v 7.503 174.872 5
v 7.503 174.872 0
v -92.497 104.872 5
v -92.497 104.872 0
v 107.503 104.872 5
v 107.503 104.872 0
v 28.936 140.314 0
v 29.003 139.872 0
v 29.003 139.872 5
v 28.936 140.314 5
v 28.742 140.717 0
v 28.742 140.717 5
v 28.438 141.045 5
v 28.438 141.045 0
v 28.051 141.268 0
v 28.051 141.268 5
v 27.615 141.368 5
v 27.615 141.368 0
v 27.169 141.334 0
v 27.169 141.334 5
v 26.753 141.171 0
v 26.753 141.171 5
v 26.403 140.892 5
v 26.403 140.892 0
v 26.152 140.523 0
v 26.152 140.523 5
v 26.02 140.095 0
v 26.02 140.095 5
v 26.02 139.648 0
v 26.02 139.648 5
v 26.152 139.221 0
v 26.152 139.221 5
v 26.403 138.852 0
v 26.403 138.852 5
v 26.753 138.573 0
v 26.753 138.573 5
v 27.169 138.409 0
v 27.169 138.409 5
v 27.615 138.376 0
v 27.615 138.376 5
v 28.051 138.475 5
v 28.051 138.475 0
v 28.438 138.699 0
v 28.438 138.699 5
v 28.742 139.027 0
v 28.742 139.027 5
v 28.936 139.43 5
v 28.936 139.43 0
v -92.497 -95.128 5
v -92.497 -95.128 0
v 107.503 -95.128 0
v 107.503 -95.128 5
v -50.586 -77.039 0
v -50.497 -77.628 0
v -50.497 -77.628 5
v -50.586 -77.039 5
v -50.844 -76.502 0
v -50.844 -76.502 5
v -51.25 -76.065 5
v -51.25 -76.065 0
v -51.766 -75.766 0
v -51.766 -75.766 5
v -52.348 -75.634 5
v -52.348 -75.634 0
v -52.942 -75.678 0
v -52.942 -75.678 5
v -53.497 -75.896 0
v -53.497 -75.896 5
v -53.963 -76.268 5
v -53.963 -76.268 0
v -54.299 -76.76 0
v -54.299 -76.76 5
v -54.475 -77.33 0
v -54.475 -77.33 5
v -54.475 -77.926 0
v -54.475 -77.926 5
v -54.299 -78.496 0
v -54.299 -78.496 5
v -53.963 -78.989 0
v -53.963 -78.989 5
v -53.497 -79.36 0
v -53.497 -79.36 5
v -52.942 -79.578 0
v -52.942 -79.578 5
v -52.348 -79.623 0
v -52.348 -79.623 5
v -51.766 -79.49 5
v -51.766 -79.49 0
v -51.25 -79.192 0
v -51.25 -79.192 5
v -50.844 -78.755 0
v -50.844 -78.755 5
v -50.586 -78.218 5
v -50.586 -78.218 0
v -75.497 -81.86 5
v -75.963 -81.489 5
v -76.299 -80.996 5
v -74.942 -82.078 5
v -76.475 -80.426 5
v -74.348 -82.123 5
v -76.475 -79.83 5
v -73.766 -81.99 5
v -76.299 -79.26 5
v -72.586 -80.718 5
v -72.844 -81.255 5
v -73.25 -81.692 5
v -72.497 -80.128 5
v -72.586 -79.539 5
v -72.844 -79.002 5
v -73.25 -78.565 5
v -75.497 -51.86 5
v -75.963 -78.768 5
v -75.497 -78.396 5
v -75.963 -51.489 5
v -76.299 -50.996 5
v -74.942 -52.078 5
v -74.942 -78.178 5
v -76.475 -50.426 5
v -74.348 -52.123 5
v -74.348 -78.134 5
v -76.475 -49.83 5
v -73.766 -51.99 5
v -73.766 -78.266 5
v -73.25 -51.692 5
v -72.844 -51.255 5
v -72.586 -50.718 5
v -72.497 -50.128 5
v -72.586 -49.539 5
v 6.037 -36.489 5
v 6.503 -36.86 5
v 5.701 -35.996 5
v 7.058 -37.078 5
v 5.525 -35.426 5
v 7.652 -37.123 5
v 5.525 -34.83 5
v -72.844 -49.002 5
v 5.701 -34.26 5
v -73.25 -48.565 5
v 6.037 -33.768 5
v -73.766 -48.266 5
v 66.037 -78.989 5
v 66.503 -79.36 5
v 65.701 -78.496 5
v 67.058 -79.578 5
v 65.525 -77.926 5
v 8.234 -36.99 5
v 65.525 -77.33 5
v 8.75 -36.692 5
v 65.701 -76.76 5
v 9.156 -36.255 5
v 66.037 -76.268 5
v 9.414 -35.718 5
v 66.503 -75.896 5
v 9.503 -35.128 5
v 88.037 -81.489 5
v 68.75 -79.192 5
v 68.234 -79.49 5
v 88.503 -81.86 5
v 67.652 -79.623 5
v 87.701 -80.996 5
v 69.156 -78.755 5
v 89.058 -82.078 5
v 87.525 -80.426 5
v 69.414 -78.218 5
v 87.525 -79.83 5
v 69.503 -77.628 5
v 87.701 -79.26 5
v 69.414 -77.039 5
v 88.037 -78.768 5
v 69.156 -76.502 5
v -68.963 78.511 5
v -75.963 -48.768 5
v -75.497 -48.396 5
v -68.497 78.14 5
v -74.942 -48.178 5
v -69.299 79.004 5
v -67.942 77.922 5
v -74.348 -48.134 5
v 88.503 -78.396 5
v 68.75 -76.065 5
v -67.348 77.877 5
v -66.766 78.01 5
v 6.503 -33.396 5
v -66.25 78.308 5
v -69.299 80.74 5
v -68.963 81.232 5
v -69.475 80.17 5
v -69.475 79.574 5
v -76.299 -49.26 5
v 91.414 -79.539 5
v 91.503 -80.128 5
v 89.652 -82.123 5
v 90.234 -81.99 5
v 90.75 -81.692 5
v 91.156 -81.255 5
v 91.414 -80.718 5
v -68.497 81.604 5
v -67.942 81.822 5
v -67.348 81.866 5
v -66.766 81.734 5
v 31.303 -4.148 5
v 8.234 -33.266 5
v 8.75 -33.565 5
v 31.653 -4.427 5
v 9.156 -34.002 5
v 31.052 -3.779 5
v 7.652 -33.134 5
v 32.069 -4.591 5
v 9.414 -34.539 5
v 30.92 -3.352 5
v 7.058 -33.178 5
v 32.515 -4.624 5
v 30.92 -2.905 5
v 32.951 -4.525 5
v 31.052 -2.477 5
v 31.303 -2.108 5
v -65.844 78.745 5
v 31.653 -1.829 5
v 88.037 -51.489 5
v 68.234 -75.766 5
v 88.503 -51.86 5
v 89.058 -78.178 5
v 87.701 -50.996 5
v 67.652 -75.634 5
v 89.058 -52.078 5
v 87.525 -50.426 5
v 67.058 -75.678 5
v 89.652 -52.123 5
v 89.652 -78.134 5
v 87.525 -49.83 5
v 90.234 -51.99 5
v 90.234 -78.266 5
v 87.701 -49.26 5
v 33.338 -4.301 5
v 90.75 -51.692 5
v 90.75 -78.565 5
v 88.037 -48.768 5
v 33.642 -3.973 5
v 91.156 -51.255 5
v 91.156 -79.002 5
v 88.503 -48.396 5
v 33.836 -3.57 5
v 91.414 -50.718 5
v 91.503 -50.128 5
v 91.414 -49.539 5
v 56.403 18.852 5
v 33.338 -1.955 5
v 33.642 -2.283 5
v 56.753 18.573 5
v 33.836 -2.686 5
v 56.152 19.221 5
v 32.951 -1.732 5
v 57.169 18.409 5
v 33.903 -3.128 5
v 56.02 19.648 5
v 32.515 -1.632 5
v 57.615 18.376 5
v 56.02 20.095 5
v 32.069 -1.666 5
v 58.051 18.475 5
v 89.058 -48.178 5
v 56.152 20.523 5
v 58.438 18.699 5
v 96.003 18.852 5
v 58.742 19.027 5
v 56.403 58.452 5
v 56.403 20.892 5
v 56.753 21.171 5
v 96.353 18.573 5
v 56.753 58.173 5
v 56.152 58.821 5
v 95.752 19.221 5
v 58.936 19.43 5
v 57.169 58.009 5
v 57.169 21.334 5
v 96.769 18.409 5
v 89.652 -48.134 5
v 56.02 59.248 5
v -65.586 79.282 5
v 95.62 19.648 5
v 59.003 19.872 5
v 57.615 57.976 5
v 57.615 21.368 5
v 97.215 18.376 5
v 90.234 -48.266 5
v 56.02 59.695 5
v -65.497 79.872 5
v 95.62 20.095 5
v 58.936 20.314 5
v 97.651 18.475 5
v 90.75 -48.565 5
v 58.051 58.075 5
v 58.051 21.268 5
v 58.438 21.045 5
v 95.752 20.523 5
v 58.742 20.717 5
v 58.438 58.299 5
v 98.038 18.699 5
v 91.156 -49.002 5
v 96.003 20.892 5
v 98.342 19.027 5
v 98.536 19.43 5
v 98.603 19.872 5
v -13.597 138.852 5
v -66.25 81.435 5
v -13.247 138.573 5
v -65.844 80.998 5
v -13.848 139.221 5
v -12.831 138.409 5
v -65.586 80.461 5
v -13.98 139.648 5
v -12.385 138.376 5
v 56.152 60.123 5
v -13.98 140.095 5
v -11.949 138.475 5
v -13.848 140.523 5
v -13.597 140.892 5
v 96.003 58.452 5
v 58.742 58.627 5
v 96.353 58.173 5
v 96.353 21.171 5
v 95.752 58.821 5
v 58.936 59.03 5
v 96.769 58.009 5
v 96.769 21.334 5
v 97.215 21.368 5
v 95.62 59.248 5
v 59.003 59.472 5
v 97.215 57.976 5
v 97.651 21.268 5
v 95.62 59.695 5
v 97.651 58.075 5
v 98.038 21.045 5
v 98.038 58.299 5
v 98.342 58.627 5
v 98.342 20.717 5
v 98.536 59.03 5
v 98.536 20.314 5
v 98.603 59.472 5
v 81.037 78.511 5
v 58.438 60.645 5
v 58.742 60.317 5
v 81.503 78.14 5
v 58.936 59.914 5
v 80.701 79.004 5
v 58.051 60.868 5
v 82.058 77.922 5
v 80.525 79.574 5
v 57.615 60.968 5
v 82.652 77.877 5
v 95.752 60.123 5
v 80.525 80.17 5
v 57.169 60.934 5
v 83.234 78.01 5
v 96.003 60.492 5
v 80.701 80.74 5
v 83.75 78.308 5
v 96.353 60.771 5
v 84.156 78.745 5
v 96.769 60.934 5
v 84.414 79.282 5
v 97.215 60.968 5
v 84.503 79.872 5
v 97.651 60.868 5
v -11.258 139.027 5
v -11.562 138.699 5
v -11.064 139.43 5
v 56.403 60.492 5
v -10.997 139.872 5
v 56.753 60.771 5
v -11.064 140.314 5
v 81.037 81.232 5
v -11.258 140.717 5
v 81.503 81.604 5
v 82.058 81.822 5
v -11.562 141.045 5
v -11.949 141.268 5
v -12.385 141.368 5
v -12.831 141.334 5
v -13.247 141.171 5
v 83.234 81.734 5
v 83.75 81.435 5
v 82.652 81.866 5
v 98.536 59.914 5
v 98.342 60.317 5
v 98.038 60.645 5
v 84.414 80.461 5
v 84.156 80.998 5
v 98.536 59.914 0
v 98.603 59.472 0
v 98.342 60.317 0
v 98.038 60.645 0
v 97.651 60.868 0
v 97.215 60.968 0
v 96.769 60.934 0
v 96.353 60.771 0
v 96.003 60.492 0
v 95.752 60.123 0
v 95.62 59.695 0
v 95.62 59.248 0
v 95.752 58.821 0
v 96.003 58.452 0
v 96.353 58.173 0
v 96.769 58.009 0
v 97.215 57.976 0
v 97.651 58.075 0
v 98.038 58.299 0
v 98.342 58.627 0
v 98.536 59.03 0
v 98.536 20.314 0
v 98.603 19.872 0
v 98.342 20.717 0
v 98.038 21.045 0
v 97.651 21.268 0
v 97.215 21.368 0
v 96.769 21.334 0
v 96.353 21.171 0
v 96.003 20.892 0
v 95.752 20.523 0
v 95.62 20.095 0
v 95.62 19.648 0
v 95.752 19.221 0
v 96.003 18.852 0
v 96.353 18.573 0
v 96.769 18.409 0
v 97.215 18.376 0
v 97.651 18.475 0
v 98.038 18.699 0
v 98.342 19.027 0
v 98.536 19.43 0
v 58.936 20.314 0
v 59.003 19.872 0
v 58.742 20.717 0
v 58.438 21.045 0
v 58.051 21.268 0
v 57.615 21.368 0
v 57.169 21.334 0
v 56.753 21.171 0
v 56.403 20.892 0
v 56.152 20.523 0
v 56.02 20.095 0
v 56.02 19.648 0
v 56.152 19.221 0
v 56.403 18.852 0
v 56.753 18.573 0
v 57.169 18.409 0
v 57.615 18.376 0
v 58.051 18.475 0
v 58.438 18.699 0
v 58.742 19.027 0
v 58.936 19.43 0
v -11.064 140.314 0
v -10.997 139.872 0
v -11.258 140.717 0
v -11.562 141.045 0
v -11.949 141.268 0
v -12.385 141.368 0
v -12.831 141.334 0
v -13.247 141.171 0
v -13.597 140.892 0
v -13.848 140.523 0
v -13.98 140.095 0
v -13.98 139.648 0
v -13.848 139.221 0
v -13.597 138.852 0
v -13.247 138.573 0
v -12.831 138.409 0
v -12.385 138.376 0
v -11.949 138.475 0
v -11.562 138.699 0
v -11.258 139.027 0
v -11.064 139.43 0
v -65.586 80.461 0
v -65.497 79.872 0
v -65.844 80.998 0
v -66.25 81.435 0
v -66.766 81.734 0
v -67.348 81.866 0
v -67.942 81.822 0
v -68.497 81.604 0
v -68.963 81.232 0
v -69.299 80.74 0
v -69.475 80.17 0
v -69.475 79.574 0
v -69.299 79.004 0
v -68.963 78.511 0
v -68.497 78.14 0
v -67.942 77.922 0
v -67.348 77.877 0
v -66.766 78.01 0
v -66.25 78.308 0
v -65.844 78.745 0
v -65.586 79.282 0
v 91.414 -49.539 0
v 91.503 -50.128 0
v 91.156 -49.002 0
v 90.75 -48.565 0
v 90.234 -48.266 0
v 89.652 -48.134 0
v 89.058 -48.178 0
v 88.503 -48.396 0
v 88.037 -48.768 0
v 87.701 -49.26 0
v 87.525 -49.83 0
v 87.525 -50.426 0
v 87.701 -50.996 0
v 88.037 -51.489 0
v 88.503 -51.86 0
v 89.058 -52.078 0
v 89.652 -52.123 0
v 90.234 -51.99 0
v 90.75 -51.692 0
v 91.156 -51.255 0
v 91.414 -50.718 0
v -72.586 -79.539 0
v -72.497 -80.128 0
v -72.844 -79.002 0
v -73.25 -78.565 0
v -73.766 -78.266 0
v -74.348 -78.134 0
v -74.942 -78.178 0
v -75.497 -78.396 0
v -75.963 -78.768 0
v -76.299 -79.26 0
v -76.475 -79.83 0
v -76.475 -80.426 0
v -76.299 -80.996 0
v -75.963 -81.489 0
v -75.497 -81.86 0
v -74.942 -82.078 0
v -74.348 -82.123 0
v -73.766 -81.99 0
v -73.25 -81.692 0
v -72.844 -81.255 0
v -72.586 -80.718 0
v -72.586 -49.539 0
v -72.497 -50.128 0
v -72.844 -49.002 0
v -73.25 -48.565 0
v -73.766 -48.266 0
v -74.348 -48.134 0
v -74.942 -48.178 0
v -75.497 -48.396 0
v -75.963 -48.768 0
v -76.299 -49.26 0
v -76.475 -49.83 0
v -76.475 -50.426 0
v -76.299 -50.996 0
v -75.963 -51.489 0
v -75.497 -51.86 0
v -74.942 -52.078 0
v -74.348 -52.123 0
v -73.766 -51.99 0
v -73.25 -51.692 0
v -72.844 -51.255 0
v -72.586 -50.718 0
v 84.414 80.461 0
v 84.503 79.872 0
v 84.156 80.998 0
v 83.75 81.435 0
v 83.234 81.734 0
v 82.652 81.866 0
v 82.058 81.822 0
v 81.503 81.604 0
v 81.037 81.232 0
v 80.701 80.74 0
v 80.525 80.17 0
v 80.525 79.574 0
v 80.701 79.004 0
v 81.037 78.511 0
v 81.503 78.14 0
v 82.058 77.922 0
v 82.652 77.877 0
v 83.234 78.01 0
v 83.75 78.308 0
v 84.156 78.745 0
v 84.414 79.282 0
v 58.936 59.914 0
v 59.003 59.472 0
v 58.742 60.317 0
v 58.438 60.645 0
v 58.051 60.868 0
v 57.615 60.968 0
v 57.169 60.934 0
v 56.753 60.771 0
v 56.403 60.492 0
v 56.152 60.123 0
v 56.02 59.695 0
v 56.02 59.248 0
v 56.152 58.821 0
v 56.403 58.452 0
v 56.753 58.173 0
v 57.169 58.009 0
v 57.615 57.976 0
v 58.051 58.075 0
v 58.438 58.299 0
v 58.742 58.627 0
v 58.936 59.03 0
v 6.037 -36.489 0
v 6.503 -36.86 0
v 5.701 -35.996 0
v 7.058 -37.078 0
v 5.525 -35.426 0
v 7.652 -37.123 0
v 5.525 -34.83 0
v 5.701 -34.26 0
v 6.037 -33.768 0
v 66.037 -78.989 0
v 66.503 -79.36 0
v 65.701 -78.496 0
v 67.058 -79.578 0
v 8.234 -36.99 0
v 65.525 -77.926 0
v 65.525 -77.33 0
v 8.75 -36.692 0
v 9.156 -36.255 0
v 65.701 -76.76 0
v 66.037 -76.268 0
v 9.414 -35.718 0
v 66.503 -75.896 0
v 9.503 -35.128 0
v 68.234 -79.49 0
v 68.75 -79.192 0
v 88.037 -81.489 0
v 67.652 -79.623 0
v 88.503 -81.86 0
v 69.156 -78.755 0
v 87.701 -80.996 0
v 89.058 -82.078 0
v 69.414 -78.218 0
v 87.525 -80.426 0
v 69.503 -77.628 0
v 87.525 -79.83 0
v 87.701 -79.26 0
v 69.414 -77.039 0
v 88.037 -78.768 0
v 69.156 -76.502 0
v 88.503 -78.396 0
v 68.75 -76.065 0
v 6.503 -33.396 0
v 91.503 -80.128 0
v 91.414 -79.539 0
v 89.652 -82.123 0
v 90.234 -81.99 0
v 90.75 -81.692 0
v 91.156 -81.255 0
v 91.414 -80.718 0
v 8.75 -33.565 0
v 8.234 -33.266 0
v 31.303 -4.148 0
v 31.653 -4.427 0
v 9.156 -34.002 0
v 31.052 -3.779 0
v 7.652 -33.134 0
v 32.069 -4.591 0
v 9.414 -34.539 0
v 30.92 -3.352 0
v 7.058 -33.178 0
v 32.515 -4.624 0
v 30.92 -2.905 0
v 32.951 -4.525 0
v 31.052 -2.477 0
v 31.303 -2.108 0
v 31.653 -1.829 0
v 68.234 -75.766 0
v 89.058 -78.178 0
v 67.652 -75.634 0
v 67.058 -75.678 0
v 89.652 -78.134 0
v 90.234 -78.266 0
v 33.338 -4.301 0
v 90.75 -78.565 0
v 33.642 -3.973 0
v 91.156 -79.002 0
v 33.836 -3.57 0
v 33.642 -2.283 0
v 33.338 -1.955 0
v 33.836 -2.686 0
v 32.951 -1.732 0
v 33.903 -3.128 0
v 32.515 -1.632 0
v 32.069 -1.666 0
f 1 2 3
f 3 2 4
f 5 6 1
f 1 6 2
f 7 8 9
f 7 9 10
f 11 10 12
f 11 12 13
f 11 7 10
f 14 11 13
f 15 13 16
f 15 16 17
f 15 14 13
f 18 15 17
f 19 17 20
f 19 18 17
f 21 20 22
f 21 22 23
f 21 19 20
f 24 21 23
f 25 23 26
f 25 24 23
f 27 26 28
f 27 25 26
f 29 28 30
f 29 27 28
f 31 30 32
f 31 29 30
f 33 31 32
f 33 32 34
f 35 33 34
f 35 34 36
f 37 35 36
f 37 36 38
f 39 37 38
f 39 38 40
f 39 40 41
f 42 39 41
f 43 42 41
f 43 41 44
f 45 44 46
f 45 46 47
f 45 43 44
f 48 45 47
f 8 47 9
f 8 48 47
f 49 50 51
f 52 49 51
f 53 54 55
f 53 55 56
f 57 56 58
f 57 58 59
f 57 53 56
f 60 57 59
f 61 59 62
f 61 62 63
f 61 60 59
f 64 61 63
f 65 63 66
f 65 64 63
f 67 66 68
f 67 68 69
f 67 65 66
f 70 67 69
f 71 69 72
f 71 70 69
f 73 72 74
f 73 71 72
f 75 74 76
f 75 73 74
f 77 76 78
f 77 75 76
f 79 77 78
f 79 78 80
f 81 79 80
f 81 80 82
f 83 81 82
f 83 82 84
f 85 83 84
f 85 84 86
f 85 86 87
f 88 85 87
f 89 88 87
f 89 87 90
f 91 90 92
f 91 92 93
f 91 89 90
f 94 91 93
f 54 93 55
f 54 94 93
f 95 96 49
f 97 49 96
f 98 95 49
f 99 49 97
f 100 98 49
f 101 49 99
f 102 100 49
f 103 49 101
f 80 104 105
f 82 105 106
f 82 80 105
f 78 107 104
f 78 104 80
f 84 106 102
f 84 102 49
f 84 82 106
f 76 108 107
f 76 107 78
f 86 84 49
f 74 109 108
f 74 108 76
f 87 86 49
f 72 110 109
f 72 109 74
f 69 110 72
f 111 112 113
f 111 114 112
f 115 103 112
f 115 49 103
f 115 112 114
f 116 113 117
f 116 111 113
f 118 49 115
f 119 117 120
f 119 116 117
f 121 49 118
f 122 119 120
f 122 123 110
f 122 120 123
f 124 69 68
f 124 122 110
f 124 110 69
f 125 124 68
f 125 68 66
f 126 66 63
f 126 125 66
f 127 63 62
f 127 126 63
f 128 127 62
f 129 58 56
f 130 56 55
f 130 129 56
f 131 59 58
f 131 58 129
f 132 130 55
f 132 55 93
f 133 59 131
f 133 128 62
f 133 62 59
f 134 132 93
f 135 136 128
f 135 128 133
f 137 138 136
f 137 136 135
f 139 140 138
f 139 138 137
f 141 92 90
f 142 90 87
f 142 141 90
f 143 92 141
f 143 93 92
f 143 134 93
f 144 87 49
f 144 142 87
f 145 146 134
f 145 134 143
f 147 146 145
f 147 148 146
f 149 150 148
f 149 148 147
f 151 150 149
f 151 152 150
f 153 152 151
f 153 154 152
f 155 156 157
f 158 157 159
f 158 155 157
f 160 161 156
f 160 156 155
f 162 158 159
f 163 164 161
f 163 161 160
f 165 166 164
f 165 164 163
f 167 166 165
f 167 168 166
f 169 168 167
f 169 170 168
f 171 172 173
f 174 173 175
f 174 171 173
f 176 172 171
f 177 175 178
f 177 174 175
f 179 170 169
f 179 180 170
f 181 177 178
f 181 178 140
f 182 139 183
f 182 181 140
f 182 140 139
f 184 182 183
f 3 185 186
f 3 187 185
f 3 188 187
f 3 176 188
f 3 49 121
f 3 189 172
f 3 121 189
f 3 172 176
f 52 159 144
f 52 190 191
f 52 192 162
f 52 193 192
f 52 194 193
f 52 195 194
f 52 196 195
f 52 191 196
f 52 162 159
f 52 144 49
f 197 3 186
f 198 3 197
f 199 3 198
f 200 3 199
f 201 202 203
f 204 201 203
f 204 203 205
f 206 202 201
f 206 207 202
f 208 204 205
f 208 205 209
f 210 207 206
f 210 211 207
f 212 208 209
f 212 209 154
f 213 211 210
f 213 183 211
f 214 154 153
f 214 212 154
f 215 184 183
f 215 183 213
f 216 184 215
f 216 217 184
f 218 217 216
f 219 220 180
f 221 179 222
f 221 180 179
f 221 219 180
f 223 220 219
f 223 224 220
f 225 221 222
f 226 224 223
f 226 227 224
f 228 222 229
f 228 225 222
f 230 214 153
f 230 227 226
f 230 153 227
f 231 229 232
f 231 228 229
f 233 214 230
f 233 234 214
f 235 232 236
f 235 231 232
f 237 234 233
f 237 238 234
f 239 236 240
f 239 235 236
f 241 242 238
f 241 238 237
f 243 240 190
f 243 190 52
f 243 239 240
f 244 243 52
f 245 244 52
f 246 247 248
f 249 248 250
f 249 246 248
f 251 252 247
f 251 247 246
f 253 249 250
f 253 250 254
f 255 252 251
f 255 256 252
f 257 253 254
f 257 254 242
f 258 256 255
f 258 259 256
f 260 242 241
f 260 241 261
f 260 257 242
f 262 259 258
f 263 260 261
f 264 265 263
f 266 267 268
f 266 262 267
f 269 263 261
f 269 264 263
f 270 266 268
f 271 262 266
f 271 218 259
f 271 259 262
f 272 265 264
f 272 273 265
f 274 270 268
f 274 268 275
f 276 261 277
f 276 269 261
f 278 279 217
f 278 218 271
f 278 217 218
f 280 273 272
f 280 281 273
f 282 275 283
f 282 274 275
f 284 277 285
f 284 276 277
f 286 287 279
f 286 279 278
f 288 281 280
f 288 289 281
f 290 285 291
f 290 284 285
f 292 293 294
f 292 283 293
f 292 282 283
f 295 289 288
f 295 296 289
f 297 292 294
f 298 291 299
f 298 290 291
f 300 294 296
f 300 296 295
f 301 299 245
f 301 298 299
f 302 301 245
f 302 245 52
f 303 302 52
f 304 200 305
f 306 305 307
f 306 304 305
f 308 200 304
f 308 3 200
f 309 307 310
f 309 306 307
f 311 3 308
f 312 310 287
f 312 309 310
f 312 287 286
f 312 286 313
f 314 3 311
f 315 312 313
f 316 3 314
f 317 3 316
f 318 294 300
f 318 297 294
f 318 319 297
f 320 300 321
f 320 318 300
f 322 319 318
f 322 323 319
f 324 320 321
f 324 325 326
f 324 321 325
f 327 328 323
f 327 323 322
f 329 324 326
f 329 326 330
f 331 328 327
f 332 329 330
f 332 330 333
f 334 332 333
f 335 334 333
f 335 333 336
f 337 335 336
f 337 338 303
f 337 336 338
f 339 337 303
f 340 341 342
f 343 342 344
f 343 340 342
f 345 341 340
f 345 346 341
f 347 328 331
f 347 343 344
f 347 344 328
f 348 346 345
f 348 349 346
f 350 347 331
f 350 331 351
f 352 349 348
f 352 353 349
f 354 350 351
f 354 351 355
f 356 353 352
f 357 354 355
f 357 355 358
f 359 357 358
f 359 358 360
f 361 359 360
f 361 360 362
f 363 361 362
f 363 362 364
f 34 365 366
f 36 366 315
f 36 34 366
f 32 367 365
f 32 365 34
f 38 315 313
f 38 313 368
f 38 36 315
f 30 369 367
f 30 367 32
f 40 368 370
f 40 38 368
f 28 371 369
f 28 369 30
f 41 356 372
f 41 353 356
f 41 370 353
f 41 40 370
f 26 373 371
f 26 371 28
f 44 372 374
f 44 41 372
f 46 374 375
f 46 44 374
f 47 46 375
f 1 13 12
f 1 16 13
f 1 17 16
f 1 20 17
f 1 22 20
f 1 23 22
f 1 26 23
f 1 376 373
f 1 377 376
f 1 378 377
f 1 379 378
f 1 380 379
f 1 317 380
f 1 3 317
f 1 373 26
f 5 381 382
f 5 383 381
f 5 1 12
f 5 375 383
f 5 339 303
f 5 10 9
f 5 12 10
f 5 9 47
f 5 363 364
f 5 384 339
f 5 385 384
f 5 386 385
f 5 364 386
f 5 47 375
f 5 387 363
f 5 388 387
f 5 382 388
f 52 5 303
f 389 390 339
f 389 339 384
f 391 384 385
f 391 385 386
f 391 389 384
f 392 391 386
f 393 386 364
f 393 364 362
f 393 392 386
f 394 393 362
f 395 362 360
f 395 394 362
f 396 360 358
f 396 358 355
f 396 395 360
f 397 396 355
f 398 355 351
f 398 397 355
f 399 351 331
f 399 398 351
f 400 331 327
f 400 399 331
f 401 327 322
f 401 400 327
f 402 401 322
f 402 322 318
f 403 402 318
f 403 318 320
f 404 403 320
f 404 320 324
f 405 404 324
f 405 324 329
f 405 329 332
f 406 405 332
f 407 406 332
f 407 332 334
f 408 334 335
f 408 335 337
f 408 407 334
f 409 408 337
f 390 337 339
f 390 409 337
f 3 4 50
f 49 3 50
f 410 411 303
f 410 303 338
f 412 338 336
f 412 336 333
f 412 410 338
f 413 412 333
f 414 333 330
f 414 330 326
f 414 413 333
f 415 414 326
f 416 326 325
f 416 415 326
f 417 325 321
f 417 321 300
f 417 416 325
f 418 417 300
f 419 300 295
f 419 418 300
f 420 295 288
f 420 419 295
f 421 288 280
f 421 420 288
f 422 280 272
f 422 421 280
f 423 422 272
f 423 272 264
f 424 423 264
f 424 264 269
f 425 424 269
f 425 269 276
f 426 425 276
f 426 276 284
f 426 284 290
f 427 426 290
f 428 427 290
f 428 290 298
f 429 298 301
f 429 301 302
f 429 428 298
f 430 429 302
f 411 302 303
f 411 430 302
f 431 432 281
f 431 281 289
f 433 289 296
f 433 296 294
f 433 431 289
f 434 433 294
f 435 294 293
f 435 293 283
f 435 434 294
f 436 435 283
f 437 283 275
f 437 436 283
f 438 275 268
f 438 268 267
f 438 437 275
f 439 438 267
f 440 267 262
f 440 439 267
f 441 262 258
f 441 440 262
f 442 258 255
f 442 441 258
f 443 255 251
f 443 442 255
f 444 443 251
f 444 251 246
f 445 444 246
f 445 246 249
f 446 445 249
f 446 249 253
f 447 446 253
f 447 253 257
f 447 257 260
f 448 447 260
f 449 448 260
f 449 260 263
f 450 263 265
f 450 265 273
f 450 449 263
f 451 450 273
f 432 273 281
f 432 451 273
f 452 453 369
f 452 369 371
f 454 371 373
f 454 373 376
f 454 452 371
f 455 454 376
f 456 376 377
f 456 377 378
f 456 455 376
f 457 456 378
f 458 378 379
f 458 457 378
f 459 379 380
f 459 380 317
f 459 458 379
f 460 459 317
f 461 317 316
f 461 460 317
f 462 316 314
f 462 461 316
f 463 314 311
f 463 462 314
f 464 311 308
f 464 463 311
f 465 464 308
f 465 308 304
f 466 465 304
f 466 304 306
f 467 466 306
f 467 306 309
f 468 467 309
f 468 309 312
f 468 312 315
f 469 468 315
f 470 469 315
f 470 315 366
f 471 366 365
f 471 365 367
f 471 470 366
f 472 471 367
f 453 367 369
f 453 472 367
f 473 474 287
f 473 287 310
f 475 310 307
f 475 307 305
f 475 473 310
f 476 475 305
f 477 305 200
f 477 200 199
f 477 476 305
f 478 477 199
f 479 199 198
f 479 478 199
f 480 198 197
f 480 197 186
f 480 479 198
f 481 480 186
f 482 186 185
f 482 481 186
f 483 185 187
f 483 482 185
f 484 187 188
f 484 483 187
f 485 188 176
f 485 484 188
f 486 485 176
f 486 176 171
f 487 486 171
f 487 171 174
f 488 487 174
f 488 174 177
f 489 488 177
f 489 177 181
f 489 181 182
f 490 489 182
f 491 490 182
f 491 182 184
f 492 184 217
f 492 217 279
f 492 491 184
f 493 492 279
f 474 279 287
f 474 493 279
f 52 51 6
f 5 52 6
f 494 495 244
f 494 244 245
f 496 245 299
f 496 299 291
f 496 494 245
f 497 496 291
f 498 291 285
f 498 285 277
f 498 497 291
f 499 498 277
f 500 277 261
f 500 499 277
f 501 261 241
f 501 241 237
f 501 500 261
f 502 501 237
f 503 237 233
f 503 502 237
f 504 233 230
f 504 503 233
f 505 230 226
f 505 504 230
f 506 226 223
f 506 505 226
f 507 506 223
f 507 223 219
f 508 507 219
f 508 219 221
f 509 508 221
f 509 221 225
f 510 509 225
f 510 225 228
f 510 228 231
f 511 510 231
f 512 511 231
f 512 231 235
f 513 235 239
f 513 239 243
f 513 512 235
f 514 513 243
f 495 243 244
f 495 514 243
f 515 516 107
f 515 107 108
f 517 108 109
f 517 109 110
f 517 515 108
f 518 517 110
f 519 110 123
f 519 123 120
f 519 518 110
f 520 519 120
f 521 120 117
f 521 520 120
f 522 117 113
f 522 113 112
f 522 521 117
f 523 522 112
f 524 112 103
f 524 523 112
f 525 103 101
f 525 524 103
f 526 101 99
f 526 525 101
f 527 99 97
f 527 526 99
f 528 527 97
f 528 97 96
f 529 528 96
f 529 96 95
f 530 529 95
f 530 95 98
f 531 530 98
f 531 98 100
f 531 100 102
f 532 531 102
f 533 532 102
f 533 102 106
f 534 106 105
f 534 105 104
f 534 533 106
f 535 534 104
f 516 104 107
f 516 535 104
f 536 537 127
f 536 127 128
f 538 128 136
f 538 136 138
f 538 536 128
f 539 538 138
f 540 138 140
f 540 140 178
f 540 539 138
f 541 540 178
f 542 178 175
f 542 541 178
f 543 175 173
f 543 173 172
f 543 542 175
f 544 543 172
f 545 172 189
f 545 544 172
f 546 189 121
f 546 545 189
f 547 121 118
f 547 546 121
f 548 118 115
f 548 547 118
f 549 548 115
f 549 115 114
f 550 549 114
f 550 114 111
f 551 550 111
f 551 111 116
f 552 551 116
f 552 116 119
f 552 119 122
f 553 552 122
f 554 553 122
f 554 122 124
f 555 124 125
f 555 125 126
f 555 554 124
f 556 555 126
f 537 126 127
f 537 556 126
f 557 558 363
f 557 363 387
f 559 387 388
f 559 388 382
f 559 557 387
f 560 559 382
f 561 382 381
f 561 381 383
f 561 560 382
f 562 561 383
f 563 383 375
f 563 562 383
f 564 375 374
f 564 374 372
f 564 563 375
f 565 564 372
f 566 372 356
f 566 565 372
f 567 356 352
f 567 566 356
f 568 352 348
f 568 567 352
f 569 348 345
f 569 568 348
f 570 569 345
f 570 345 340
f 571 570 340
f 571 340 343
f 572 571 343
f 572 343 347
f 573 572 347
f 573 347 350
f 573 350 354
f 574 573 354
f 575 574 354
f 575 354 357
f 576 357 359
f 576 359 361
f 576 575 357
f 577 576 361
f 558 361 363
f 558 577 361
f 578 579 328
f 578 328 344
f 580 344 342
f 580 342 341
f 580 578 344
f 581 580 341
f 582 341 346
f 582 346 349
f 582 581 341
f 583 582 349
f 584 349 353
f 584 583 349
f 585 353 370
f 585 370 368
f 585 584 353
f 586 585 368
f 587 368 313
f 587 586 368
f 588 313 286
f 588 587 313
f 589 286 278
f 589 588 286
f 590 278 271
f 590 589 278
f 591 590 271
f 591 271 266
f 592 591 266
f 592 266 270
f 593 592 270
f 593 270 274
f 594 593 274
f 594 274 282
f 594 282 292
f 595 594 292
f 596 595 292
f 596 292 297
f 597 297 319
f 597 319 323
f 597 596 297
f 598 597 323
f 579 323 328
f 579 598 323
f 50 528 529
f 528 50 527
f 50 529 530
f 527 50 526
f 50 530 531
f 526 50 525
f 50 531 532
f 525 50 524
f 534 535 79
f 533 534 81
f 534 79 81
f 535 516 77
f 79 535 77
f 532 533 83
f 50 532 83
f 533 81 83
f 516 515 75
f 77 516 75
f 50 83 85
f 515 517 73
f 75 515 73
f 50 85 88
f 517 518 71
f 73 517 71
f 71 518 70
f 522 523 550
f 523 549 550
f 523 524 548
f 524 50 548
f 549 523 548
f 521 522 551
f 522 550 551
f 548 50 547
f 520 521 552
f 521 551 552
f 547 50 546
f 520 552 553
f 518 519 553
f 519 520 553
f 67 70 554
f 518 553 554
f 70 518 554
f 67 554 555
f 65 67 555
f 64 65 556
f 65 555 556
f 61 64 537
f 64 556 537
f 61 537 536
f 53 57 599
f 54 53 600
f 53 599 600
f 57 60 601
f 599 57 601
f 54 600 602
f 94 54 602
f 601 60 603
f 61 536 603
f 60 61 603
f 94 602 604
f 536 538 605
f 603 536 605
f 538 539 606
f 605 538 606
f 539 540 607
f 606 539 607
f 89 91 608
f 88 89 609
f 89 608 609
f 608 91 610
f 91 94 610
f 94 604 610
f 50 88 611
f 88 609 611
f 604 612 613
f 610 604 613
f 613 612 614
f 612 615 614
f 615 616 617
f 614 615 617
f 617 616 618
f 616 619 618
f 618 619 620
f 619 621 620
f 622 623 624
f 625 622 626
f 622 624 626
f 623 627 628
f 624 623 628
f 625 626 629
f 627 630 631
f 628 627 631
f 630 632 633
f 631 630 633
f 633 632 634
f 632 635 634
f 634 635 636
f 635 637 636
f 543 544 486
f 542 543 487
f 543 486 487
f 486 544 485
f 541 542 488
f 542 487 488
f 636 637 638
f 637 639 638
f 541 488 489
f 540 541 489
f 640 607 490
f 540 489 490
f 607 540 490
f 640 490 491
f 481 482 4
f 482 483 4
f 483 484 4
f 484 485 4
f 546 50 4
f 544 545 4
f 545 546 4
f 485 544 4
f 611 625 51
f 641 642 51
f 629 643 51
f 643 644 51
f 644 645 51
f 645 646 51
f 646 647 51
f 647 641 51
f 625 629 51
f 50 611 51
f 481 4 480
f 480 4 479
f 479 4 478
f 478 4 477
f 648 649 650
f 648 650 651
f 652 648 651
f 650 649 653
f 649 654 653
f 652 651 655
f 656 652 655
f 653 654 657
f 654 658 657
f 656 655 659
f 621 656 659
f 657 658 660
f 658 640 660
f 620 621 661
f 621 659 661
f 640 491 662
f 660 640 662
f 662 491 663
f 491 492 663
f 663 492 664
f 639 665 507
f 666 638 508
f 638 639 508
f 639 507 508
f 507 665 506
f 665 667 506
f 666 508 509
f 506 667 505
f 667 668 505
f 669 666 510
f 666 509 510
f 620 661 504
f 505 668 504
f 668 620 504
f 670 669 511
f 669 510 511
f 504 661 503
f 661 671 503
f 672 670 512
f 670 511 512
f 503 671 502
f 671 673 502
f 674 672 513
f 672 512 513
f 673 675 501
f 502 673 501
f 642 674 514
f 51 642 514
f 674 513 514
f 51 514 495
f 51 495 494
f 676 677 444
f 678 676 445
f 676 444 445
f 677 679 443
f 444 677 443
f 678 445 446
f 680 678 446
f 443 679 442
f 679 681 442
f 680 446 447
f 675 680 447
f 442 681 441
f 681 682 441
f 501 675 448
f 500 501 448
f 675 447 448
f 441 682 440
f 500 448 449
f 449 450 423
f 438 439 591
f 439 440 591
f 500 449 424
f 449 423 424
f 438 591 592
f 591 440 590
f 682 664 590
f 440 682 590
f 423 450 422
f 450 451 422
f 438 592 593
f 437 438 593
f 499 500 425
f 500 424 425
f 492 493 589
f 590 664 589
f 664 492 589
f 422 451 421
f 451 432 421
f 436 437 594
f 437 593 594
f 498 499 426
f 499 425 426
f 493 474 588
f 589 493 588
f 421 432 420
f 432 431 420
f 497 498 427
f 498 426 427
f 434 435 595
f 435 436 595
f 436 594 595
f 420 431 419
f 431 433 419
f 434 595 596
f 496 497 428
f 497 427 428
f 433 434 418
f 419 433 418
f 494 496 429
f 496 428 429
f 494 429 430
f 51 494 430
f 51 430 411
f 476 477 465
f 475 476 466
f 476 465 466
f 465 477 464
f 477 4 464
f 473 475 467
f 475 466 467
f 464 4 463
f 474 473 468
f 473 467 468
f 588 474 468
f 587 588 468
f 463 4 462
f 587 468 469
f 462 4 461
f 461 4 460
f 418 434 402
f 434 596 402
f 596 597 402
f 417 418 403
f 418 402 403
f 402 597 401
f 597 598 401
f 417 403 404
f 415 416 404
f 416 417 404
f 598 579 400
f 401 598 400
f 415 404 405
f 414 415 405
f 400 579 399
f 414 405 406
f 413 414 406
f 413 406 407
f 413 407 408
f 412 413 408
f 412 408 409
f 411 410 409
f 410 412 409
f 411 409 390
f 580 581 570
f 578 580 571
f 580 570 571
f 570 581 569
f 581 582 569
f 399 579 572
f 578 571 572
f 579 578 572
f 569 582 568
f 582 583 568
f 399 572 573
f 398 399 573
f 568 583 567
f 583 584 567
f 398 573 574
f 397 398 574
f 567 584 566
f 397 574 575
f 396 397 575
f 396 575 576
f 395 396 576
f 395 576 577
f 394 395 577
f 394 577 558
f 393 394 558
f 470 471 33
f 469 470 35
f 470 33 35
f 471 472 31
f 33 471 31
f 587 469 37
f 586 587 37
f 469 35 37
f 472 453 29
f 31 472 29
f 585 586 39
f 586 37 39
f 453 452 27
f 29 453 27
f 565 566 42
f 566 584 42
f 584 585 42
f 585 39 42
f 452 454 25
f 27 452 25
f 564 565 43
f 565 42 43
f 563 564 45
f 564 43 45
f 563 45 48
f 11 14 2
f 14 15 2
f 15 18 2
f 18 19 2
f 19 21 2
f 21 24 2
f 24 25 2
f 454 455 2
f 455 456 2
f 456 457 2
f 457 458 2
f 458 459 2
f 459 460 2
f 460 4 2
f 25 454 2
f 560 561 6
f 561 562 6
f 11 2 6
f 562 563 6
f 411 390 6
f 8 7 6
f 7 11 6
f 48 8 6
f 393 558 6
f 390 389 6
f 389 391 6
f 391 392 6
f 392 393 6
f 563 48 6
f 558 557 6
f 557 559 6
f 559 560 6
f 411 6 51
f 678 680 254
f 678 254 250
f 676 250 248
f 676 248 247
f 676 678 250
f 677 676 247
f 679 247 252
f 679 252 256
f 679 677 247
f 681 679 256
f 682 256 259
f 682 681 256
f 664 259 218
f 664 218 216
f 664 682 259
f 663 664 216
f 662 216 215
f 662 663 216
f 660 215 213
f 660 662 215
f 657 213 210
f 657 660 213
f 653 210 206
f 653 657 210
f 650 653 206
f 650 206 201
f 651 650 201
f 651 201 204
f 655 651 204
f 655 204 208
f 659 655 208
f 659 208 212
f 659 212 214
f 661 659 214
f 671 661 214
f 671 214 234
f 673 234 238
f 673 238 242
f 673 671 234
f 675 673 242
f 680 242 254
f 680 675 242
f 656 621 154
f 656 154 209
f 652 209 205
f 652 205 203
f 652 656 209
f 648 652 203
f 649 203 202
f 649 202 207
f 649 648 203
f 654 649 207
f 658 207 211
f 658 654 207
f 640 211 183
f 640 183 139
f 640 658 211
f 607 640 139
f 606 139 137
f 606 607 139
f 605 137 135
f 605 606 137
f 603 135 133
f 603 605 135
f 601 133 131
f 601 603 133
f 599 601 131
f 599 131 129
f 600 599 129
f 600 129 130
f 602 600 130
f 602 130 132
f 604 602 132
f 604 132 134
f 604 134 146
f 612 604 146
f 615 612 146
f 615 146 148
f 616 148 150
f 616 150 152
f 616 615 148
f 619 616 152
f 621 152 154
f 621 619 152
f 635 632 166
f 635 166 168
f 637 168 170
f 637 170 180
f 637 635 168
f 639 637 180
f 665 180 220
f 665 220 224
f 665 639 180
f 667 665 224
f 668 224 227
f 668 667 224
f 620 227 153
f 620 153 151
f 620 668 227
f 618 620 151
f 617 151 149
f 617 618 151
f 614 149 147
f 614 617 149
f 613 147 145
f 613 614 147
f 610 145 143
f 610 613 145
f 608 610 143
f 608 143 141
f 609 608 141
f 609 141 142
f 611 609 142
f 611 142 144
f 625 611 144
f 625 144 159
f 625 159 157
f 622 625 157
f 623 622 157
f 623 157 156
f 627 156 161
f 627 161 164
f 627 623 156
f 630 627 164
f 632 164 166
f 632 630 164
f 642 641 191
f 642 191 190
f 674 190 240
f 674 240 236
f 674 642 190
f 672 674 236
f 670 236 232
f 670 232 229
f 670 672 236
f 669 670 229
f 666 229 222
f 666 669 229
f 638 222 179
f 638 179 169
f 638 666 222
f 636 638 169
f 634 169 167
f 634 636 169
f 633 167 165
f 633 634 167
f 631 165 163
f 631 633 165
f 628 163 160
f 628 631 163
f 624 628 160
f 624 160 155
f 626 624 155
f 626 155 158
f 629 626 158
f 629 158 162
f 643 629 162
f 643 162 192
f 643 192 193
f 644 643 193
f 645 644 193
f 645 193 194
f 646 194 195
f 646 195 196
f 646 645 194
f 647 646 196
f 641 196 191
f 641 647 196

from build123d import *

# Parameters (mm, degrees)
SKETCH1_R           = 2
SKETCH1_R_2         = 1.5
BOSS_EXTRUDE1_DEPTH = 5


with BuildPart() as part:
    # Sketch1 → Boss-Extrude1 (new body)
    with BuildSketch(Plane.XY):
        Polygon((-92.496965253, 104.871794872), (-92.496965253, -95.128205128), (107.503034747, -95.128205128), (107.503034747, 104.871794872), (7.503034747, 174.871794872), align=None)
        with Locations((89.503034747, -80.128205128)):
            Circle(SKETCH1_R, mode=Mode.SUBTRACT)
        with Locations((-74.496965253, -80.128205128)):
            Circle(SKETCH1_R, mode=Mode.SUBTRACT)
        with Locations((27.503034747, 139.871794872)):
            Circle(SKETCH1_R_2, mode=Mode.SUBTRACT)
        with Locations((-12.496965253, 139.871794872)):
            Circle(SKETCH1_R_2, mode=Mode.SUBTRACT)
        with Locations((89.503034747, -50.128205128)):
            Circle(SKETCH1_R, mode=Mode.SUBTRACT)
        with Locations((-74.496965253, -50.128205128)):
            Circle(SKETCH1_R, mode=Mode.SUBTRACT)
        with Locations((7.503034747, -35.128205128)):
            Circle(SKETCH1_R, mode=Mode.SUBTRACT)
        with Locations((32.403034747, -3.128205128)):
            Circle(SKETCH1_R_2, mode=Mode.SUBTRACT)
        with Locations((57.503034747, 19.871794872)):
            Circle(SKETCH1_R_2, mode=Mode.SUBTRACT)
        with Locations((-52.496965253, -77.628205128)):
            Circle(SKETCH1_R, mode=Mode.SUBTRACT)
        with Locations((67.503034747, -77.628205128)):
            Circle(SKETCH1_R, mode=Mode.SUBTRACT)
        with Locations((-67.496965253, 79.871794872)):
            Circle(SKETCH1_R, mode=Mode.SUBTRACT)
        with Locations((82.503034747, 79.871794872)):
            Circle(SKETCH1_R, mode=Mode.SUBTRACT)
        with Locations((57.503034747, 59.471794872)):
            Circle(SKETCH1_R_2, mode=Mode.SUBTRACT)
        with Locations((97.103034747, 19.871794872)):
            Circle(SKETCH1_R_2, mode=Mode.SUBTRACT)
        with Locations((97.103034747, 59.471794872)):
            Circle(SKETCH1_R_2, mode=Mode.SUBTRACT)
    extrude(amount=BOSS_EXTRUDE1_DEPTH)


solid = part.part
